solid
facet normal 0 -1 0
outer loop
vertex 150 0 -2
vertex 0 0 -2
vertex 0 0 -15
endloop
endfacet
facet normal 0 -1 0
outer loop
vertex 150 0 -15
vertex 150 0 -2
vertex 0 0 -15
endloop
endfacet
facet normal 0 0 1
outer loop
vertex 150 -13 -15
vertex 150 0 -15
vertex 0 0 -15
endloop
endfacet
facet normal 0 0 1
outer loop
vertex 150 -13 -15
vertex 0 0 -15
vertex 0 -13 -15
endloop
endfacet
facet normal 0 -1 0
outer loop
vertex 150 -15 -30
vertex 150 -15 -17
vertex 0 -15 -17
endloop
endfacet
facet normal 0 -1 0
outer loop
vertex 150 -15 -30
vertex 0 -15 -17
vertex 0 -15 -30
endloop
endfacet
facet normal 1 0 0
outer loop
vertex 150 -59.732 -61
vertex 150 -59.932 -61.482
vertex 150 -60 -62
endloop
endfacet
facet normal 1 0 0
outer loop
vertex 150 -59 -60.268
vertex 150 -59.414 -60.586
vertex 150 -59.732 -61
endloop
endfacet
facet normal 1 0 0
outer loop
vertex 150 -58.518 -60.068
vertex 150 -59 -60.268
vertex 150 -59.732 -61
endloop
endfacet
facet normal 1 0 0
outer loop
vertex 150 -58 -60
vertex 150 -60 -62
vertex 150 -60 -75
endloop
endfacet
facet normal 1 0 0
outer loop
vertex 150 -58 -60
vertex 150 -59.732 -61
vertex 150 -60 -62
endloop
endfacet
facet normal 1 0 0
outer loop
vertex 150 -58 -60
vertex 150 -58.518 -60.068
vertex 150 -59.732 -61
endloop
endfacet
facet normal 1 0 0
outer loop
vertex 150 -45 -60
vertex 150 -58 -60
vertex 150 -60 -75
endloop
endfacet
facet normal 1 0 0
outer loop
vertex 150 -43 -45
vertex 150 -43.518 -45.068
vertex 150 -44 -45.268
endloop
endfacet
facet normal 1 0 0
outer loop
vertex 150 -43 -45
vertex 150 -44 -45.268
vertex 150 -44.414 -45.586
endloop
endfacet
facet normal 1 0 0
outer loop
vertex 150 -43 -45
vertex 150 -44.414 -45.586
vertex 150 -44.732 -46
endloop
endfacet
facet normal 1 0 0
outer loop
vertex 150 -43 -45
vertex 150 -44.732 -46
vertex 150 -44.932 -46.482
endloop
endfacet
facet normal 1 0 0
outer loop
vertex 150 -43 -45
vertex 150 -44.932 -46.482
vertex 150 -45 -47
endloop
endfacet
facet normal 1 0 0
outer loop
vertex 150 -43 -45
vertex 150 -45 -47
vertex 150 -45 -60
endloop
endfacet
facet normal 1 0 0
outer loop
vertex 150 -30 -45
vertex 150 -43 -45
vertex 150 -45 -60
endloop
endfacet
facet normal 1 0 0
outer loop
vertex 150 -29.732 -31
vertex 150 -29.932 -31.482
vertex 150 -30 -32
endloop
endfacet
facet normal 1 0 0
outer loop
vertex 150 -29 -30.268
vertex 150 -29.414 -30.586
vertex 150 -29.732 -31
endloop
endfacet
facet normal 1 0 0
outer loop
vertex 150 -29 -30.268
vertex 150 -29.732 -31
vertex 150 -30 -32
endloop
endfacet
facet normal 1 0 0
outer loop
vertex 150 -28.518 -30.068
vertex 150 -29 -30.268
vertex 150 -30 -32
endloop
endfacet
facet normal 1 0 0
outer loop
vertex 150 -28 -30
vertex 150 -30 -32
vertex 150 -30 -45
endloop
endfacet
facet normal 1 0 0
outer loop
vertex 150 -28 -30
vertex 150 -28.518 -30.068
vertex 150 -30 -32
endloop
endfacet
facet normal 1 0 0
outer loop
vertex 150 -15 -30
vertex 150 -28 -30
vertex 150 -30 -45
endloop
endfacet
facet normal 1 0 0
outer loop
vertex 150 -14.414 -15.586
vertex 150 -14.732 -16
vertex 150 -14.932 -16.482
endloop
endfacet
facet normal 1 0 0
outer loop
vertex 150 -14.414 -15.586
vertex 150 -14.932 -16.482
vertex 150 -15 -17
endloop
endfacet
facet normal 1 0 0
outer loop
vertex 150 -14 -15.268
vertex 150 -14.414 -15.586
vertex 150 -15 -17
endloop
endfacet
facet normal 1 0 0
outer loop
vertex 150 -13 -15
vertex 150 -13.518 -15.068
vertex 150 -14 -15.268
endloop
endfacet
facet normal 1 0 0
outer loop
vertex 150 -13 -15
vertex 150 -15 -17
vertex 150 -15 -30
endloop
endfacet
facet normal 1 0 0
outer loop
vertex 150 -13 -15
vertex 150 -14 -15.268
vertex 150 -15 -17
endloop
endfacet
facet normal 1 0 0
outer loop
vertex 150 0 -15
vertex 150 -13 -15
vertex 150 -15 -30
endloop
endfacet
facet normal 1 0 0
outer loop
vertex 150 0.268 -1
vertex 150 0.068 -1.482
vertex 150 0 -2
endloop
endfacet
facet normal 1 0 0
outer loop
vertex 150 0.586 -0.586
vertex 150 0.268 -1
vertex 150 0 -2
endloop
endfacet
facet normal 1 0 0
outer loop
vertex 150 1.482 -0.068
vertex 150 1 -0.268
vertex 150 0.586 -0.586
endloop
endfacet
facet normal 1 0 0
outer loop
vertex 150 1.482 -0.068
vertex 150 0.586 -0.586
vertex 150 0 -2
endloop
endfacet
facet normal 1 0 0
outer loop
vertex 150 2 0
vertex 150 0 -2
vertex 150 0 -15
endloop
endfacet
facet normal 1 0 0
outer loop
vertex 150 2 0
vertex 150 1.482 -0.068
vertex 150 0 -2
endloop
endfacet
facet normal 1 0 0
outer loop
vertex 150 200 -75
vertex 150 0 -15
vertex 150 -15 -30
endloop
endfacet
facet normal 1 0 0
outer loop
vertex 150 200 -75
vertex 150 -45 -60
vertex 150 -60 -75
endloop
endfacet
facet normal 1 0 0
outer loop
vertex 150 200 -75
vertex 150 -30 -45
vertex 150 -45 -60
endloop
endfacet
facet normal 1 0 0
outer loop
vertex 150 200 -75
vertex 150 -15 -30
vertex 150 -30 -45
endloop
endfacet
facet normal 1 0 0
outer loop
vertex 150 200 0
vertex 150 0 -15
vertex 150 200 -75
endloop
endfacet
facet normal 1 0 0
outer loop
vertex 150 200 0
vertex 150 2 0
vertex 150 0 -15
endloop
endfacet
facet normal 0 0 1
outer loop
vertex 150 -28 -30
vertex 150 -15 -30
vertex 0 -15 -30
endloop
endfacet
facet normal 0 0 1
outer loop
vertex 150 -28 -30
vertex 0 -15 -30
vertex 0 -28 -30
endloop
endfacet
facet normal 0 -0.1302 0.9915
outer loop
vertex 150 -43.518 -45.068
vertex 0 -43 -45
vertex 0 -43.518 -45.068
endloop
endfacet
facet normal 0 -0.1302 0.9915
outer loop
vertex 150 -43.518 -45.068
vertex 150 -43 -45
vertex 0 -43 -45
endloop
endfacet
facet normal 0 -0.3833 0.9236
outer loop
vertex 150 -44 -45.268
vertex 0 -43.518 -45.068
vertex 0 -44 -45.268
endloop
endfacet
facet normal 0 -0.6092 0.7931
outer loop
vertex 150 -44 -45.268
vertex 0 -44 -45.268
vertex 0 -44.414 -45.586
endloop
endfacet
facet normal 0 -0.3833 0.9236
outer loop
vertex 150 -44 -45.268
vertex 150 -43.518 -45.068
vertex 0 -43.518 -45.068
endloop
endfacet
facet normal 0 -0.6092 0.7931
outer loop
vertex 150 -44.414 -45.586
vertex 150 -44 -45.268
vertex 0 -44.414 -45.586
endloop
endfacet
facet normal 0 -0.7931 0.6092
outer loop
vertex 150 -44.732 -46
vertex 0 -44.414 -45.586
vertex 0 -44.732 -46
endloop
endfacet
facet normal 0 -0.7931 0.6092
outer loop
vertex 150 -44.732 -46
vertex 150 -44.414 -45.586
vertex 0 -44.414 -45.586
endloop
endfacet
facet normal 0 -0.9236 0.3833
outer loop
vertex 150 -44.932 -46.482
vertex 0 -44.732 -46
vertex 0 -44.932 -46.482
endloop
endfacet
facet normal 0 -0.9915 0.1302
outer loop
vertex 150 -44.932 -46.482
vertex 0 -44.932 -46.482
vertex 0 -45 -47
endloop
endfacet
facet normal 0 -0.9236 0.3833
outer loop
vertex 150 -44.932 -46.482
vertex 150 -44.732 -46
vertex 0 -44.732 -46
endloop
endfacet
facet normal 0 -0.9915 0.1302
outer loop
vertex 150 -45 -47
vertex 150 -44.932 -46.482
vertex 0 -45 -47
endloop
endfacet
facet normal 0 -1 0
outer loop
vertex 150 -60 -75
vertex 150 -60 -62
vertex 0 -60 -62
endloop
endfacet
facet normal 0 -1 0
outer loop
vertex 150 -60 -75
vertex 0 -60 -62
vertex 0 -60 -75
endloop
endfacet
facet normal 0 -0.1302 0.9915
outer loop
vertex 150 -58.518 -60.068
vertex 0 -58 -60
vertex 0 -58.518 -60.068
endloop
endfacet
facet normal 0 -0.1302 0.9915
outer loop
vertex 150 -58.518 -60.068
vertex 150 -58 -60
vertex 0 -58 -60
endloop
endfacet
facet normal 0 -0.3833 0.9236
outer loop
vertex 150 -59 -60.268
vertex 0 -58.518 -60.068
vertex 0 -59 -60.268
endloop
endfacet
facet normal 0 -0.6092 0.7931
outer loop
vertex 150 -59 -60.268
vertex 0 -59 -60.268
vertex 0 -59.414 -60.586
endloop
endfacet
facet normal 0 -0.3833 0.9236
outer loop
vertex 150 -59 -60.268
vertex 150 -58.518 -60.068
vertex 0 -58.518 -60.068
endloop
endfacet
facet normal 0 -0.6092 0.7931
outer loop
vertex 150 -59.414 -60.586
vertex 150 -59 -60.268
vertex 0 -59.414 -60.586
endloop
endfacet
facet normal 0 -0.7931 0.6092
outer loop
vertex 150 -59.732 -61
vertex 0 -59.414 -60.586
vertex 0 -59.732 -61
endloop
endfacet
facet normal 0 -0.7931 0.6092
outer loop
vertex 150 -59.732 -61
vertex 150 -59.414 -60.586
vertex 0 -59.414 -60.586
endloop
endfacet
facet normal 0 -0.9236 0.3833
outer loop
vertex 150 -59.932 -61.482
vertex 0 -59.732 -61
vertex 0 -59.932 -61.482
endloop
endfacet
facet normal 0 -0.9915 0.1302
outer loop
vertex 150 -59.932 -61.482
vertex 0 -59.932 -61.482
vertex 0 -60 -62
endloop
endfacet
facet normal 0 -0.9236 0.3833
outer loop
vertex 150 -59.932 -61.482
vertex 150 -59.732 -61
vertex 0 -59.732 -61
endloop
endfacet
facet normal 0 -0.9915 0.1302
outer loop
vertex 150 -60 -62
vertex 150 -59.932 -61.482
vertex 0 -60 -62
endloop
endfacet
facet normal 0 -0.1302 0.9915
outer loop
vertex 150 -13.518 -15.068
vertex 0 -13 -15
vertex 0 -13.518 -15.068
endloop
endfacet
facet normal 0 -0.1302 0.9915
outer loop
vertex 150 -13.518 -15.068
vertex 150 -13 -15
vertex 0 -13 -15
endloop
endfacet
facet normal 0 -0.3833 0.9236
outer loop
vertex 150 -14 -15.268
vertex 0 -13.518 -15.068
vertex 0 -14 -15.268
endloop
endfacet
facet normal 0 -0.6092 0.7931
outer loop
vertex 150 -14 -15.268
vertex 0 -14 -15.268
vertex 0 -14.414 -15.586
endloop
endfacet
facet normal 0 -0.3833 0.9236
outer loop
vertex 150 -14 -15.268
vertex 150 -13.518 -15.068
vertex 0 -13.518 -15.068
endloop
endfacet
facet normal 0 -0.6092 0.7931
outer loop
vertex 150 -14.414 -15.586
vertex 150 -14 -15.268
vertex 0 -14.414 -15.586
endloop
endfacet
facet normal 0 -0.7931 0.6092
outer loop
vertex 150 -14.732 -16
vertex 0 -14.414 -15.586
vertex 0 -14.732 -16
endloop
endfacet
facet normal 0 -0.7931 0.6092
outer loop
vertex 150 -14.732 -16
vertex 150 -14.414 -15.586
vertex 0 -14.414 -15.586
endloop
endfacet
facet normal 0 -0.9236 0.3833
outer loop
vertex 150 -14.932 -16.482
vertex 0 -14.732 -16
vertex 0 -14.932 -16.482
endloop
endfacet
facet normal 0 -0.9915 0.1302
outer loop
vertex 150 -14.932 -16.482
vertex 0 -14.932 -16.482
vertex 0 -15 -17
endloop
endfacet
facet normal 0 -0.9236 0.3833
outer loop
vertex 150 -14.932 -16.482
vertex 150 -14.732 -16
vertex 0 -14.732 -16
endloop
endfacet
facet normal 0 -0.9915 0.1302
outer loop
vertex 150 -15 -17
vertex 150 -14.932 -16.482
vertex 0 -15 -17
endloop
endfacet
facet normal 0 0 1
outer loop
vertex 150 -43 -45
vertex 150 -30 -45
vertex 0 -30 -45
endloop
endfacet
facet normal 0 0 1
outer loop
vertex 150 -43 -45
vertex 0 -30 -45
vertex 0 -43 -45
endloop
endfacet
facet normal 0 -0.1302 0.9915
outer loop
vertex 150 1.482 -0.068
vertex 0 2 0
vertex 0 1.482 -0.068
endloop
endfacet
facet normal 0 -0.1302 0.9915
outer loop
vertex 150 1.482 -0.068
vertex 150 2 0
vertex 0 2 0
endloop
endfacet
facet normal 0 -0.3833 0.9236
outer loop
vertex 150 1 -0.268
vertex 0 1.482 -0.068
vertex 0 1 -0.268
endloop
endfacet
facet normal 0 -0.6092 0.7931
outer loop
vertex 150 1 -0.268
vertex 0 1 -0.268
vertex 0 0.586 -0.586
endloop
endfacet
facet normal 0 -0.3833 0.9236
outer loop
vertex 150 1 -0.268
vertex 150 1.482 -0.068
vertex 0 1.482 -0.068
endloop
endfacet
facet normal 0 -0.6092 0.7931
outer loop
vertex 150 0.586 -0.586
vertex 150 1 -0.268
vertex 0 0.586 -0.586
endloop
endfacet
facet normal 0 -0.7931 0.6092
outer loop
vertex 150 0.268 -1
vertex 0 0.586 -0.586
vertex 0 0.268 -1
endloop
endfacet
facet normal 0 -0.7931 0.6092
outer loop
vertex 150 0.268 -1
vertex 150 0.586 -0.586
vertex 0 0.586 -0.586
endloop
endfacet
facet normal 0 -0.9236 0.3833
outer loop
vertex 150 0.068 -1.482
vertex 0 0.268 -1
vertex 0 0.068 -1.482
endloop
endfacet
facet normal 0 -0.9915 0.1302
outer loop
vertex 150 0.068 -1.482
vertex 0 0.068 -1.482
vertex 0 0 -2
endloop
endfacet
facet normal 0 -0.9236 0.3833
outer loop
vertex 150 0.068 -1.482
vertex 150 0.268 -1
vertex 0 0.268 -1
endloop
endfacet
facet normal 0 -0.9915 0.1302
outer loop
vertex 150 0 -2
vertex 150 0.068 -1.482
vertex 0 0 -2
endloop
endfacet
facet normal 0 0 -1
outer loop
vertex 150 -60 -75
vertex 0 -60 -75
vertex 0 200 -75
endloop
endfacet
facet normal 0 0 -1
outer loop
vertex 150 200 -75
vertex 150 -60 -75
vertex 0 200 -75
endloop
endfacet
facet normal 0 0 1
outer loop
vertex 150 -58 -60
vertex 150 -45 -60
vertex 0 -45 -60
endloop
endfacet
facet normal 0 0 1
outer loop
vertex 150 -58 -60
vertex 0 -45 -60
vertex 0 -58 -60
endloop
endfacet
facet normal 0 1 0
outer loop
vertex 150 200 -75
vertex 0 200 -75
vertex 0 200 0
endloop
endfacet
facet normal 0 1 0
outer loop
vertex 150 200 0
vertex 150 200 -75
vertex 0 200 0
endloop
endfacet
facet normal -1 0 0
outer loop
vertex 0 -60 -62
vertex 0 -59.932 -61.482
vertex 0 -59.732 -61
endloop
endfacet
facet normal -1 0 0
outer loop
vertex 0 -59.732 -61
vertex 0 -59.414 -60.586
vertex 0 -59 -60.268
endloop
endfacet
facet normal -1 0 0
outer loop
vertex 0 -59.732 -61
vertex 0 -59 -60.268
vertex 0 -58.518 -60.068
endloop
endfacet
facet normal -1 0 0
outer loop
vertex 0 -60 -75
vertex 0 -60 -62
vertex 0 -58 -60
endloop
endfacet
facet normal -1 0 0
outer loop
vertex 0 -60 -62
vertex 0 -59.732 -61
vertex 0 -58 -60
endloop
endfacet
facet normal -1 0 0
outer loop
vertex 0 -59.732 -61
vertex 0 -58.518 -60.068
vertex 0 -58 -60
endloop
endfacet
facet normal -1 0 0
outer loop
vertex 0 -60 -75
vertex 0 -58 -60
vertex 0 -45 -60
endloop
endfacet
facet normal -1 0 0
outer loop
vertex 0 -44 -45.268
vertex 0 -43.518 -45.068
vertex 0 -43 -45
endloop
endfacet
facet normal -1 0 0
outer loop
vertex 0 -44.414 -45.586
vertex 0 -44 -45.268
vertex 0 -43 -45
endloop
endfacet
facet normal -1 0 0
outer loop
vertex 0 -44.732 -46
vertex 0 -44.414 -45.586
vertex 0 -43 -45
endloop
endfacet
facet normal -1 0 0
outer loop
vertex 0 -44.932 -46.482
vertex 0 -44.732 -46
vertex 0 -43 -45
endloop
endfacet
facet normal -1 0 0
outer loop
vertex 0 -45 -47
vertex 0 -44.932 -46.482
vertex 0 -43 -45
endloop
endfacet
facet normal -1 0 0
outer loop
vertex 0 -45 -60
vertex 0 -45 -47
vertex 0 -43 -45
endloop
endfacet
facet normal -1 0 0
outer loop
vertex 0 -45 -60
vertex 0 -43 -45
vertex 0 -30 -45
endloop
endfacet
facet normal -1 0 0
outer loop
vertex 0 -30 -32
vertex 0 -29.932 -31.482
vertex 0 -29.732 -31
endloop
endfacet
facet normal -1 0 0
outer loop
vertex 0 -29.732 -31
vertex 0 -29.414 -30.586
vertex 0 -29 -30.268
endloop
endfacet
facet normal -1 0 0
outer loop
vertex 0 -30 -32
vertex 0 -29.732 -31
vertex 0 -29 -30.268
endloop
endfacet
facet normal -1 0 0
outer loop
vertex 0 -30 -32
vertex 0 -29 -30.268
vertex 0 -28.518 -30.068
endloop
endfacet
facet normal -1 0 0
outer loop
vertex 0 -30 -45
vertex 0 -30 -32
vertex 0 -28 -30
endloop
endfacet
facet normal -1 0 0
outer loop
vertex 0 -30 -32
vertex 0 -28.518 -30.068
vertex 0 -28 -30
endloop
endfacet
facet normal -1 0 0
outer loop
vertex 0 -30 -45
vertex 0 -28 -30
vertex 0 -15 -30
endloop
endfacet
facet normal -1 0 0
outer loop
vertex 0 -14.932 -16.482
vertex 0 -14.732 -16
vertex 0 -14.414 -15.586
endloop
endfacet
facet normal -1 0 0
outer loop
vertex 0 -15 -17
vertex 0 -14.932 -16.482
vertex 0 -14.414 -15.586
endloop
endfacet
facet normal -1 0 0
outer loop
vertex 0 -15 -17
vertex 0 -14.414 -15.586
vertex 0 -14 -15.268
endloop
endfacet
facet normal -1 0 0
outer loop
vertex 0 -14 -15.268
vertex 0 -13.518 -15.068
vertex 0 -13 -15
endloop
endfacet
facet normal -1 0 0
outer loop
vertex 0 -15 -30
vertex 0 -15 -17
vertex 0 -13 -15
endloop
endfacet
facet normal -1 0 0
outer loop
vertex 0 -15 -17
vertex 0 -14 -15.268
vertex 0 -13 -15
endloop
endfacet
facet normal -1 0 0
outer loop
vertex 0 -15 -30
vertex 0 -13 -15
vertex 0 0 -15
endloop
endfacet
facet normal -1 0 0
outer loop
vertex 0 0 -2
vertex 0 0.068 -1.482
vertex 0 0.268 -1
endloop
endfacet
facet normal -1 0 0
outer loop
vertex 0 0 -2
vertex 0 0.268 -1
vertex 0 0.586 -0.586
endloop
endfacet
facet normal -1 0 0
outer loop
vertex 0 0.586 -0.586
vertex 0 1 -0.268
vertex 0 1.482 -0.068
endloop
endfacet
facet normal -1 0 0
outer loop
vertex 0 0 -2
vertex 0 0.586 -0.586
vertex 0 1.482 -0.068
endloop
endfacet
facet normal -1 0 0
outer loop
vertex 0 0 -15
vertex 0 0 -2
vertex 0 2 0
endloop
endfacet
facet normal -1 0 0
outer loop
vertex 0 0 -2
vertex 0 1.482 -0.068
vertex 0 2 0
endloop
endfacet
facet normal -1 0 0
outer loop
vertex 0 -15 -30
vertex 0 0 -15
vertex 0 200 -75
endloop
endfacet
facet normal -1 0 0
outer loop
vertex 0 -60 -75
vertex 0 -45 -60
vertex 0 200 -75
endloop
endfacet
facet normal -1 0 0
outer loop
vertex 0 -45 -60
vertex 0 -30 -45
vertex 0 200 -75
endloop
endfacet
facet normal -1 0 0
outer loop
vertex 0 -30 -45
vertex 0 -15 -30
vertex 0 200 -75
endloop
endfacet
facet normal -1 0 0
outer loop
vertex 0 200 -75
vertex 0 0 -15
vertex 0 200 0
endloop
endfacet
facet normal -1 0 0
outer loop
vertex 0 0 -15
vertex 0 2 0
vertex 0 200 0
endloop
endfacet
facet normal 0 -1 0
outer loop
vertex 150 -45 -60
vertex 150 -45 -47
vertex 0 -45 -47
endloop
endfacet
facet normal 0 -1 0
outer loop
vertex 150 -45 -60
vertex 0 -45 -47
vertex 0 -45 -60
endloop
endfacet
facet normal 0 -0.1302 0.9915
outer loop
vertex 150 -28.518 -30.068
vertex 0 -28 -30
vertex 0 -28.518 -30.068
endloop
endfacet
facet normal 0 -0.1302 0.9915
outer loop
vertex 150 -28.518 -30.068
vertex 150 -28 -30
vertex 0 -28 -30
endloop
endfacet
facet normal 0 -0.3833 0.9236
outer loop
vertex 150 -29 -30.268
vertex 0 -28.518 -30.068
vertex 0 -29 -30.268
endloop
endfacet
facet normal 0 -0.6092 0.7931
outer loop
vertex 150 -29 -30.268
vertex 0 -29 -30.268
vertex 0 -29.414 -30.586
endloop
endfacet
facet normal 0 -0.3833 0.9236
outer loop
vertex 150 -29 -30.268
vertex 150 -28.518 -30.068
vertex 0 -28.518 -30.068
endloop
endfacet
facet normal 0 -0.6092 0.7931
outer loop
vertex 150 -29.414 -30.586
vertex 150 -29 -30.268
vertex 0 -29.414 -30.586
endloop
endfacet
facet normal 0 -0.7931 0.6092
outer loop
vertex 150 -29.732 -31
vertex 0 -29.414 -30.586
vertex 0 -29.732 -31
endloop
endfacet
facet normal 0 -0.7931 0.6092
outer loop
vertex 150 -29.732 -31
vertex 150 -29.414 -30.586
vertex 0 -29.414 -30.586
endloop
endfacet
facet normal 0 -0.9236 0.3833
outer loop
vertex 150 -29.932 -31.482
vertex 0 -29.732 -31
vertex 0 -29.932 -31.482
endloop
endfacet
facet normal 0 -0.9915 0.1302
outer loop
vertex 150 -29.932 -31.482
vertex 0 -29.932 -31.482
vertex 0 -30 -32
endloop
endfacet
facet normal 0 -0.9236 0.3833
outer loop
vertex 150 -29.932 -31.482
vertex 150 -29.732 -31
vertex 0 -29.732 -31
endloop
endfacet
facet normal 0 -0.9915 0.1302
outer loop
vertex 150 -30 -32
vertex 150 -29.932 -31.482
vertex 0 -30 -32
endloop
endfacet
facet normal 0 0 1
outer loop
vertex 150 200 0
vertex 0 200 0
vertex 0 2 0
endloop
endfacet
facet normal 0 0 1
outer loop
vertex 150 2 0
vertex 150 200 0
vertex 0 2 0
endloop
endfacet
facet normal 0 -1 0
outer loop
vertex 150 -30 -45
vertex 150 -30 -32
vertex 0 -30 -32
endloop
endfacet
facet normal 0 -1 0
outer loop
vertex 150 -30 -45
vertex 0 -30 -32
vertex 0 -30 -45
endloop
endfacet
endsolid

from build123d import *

# Parameters (mm, degrees)
F1_DEPTH = 150
F2_R     = 2


with BuildPart() as f1:
    # F0 (on Right) → F1 (new body)
    with BuildSketch(Plane.YZ):
        Polygon((200, 0), (0, 0), (0, -15), (-15, -15), (-15, -30), (-30, -30), (-30, -45), (-45, -45), (-45, -60), (-60, -60), (-60, -75), (200, -75), align=None)
    extrude(amount=F1_DEPTH)

    # F2
    f2_edges = [f1.edges().sort_by_distance(p)[0] for p in [
        (75, -15, -15),
        (75, 0, 0),
        (75, -30, -30),
        (75, -45, -45),
        (75, -60, -60),
    ]]
    fillet(f2_edges, radius=F2_R)


solid = f1.part
